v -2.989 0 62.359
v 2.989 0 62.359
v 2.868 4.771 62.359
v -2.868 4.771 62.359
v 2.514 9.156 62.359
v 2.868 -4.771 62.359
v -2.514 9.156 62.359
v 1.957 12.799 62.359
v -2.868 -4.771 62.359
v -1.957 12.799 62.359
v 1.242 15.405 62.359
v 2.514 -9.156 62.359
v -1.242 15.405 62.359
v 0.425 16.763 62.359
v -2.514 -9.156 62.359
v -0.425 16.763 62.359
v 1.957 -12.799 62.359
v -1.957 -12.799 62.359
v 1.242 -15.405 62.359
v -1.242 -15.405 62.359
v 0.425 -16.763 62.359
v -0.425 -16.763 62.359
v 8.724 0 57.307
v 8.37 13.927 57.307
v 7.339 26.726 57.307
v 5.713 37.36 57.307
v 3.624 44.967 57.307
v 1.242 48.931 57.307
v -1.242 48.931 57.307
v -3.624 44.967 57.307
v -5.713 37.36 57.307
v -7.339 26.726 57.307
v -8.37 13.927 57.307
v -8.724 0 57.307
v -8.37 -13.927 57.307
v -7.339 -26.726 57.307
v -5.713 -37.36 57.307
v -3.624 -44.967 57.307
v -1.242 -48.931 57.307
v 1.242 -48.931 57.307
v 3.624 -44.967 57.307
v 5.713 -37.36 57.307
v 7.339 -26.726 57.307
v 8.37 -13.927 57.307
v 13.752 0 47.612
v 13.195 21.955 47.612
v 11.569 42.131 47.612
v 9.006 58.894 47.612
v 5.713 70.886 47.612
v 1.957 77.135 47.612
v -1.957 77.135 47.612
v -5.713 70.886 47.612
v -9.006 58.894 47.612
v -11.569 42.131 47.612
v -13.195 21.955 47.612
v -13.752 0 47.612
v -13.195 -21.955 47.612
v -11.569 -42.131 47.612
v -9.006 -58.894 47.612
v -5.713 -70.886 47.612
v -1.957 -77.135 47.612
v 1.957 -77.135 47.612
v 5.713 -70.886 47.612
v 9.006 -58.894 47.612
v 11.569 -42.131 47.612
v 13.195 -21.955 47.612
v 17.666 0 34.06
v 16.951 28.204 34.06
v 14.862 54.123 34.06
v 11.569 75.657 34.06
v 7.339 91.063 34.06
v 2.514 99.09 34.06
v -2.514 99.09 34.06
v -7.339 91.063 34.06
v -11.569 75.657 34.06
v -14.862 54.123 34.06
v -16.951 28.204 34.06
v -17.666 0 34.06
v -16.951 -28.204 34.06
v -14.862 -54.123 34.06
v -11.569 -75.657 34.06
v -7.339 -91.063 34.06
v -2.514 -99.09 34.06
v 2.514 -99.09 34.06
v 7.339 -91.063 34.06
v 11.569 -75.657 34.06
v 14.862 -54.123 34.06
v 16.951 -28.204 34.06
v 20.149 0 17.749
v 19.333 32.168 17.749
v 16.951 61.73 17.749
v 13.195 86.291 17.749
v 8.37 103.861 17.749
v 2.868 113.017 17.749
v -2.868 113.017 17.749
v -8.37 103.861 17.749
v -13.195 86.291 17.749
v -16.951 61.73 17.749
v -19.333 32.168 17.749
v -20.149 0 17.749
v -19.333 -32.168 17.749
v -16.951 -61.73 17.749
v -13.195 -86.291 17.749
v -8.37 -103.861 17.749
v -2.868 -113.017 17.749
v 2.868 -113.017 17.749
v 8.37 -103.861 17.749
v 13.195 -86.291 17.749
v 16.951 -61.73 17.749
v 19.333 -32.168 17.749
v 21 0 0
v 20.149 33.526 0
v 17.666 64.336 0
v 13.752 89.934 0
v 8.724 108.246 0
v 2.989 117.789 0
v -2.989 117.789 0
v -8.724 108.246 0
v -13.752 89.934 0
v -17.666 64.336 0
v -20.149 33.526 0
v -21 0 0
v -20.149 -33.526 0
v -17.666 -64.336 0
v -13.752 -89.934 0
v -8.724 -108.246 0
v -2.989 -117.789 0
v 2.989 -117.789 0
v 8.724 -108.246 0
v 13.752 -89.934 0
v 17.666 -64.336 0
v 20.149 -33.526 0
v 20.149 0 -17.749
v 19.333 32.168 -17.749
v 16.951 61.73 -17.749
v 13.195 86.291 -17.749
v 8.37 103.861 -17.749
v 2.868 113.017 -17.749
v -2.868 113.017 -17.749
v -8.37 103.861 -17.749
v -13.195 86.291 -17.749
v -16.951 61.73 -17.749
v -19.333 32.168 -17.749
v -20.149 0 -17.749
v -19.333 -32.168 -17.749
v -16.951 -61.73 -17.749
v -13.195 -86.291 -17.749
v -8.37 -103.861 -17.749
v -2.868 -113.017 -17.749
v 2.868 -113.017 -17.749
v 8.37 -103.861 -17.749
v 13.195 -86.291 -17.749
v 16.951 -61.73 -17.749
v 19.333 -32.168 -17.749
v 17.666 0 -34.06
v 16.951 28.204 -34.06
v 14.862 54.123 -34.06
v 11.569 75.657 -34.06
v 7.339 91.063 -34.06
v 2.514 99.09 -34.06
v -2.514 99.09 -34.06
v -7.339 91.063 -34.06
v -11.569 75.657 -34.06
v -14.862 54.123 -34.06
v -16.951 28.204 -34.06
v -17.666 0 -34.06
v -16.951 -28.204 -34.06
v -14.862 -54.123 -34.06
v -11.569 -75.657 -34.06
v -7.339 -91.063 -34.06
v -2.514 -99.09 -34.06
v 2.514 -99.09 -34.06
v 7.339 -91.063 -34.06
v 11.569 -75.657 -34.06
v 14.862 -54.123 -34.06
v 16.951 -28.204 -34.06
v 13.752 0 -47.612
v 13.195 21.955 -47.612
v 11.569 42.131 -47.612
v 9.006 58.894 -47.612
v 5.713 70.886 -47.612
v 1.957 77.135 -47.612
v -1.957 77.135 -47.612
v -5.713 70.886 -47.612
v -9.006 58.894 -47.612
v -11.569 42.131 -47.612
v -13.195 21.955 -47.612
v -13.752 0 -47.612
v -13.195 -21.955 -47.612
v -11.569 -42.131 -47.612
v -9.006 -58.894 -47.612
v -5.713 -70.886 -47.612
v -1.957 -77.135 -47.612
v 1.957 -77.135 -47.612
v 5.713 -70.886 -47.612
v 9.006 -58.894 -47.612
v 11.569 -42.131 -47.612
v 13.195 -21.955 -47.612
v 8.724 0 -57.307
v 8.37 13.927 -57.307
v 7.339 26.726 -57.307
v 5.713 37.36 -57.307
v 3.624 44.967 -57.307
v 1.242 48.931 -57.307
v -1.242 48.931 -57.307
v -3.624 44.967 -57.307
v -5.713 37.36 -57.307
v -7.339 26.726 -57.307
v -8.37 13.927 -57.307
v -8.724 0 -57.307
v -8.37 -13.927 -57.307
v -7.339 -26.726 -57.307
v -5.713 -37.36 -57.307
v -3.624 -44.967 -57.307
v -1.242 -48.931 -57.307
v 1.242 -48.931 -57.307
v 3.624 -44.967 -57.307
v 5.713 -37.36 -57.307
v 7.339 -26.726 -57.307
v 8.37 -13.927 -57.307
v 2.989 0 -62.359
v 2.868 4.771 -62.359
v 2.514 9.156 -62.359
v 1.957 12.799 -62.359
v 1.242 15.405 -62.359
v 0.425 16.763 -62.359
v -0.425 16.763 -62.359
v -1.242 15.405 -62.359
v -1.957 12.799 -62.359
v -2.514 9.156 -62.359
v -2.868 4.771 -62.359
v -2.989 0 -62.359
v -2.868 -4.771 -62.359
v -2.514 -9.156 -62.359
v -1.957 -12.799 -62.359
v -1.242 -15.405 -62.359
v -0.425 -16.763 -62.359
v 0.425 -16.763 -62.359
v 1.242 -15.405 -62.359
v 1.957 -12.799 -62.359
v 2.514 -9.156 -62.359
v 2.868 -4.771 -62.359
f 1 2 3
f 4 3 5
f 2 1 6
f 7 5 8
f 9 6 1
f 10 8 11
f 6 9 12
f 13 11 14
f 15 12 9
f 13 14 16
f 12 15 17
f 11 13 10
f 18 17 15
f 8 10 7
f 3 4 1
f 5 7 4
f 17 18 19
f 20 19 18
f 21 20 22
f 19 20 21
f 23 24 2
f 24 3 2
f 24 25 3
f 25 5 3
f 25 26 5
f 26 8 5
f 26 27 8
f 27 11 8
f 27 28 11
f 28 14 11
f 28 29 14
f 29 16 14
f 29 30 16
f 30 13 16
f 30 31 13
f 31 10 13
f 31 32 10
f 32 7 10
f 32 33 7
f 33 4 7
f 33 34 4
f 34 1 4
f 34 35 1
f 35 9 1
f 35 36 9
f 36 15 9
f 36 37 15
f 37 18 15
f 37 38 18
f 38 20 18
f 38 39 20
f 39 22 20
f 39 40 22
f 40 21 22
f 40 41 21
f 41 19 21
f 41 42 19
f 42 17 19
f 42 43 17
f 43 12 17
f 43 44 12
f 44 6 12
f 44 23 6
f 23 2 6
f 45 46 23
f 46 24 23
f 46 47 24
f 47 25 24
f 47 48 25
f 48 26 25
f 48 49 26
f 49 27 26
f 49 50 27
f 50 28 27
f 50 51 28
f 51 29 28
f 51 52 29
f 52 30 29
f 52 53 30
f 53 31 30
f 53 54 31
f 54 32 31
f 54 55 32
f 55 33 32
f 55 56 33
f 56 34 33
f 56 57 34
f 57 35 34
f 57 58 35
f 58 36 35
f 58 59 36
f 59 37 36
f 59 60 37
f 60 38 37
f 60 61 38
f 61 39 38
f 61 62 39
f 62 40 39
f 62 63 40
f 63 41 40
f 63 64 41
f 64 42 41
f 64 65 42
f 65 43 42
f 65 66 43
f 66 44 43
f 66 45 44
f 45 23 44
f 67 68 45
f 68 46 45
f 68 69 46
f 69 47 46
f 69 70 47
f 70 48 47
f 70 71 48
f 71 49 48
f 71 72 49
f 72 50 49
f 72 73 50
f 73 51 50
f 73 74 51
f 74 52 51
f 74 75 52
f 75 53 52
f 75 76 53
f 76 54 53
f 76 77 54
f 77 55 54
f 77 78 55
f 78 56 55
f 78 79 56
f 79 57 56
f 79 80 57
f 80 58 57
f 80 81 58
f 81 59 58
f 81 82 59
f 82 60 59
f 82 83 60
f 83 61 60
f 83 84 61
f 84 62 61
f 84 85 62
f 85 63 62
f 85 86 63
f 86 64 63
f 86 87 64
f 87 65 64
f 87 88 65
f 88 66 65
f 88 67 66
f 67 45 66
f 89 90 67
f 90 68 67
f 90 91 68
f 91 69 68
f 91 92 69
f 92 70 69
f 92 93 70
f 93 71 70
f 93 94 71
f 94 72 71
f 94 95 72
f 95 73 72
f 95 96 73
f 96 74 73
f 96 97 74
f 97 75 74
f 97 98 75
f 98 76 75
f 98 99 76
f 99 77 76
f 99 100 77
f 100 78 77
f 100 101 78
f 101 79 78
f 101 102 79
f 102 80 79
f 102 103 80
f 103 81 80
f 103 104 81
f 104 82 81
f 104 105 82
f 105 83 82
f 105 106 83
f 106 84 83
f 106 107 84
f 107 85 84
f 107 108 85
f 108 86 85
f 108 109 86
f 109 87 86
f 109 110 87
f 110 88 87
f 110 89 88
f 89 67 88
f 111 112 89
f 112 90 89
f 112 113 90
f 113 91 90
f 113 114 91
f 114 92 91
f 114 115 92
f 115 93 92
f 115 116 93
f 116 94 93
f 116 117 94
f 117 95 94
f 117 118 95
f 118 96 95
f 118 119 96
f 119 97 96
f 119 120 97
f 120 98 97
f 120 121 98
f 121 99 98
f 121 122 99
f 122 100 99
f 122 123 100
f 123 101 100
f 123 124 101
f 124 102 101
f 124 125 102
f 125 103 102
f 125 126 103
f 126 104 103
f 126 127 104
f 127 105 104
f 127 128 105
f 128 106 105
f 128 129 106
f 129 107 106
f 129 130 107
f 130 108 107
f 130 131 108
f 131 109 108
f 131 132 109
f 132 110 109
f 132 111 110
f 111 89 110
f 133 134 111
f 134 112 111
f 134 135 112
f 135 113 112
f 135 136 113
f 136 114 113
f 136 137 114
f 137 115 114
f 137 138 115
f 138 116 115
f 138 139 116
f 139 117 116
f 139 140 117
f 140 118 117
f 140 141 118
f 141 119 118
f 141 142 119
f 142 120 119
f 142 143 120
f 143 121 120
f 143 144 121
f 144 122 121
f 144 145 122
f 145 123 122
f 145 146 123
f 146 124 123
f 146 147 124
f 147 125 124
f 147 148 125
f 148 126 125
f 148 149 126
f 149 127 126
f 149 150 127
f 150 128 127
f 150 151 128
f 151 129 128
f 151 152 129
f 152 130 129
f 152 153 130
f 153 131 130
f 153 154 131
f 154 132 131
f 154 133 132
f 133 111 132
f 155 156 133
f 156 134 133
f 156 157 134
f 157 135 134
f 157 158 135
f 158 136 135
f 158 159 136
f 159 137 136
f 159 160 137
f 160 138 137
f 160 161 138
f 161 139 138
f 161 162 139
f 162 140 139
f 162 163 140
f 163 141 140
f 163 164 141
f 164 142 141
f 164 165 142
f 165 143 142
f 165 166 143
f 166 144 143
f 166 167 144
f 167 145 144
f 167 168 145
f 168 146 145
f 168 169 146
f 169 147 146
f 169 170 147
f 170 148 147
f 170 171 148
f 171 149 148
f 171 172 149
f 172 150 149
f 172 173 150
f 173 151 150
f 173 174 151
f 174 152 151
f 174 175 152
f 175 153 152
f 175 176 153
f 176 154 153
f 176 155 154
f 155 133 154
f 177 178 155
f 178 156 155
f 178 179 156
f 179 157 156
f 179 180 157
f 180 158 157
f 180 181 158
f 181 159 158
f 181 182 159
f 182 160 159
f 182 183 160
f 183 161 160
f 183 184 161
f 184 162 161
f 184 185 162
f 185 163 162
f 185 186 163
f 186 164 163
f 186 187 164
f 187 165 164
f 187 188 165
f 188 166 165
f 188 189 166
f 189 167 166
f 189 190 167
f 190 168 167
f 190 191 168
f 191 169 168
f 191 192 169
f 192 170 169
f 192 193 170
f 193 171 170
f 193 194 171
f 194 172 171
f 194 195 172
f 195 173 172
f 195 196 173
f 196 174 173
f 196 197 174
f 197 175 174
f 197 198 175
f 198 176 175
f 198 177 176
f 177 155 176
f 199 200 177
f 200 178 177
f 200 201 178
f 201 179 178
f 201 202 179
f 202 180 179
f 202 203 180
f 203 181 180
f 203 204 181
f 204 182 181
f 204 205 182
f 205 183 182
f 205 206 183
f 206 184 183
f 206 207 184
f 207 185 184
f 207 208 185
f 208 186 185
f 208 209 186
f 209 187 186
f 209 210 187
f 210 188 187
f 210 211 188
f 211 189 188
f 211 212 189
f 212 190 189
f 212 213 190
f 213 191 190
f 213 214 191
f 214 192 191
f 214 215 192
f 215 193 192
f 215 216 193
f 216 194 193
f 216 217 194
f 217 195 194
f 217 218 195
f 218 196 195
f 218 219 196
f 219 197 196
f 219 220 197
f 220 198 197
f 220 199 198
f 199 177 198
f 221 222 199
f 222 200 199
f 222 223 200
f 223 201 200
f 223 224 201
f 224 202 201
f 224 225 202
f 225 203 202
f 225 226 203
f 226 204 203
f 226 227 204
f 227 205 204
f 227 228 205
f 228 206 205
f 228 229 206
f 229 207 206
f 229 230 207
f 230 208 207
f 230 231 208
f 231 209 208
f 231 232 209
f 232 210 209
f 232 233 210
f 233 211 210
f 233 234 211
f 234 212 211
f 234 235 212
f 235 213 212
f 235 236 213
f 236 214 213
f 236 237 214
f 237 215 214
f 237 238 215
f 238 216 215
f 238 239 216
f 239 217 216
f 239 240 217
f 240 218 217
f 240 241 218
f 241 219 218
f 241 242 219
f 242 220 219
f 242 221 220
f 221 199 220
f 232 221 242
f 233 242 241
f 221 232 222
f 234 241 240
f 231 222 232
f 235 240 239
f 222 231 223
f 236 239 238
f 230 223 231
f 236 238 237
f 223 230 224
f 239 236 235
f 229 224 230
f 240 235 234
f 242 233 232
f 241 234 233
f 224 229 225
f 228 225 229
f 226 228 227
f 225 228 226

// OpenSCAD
// Generated by SolidPython 1.0.1 on 2020-07-29 00:46:46


scale(v = [3, 17, 9]) {
	sphere(r = 7);
}
/***********************************************
*********      SolidPython code:      **********
************************************************
 
# import packages: SolidPython
from solid import *
from solid.utils import *
from itertools import chain, combinations, permutations


class Resize:

    def __init__(self, scad_file):
        self.scad_file = scad_file
        #self.scad_file = import_scad(scad_file)
        # cone/cylinder param:
        self.r1 = 0
        self.r2 = 0
        self.h = 0
        # rectangular prism param:
        self.w = 0
        self.l = 0
        # ellipse param:
        self.r = 0

    # import OpenScad code (file name corresponds to shape)


    # classify shape + parameters
    def assign(self, param1, param2, param3):
        if self.scad_file == 'cone.scad':
            self.r1 = param1
            self.r2 = param2
            self.h = param3
        elif self.scad_file == 'cylinder.scad':
            self.r1 = param1
            self.r2 = param2
            self.h = param3
        elif self.scad_file == 'rectangularPrism.scad':
            self.h = param1
            self.l = param2
            self.w = param3
        else:
            self.r = param1
            self.h = param2

    # resize parameters
    def iterate(self):
        x = range(3, 20, 2)
        i = 1
        if self.scad_file == 'cone.scad':
            tempList = list(permutations(x, 2))
            for temp in tempList:
                param1 = temp[0]
                param2 = temp[1]
                filepath = 'produced_scad_files/' + 'cone' + str(param1) + '_' + str(param2) + '_' + '.scad'
                scad_render_to_file(cylinder(h=param1, r1=param2, r2=0), filepath)

        elif self.scad_file == 'cylinder.scad':
            tempList = list(permutations(x, 3))
            for temp in tempList:
                param1 = temp[0]
                param2 = temp[1]
                filepath = 'produced_scad_files/' + 'cylinder' + str(param1) + '_' + str(param2) + '_' + '.scad'
                scad_render_to_file(cylinder(h=param1, r1=param2, r2=param2), filepath)

        elif self.scad_file == 'rectangularPrism.scad':
            tempList = list(permutations(x, 3))
            for temp in tempList:
                param1 = temp[0]
                param2 = temp[1]
                param3 = temp[2]
                filepath = 'produced_scad_files/' + 'rectangularPrism' + str(param1) + '_' + str(param2) + '_' + str(
                    param3) + '.scad'
                scad_render_to_file(cube(size=(param1, param2, param3)), filepath)

        elif self.scad_file == 'ellipse.scad':
            tempList = list(permutations(x, 4))
            for temp in tempList:
                param1 = temp[0]
                param2 = temp[1]
                param3 = temp[2]
                param4 = temp[3]
                filepath = 'produced_scad_files/' + 'ellipse' + str(param1) + '_' + str(param2) + '_' + str(param3) + '_' + str(param4) + '.scad'
                scad_render_to_file(scale([param1, param2, param3])(sphere(r=param4)), filepath)

    def render_to_scadfile(self):
        scad_render_to_file(scad, 'example.scad') 
 
************************************************/
